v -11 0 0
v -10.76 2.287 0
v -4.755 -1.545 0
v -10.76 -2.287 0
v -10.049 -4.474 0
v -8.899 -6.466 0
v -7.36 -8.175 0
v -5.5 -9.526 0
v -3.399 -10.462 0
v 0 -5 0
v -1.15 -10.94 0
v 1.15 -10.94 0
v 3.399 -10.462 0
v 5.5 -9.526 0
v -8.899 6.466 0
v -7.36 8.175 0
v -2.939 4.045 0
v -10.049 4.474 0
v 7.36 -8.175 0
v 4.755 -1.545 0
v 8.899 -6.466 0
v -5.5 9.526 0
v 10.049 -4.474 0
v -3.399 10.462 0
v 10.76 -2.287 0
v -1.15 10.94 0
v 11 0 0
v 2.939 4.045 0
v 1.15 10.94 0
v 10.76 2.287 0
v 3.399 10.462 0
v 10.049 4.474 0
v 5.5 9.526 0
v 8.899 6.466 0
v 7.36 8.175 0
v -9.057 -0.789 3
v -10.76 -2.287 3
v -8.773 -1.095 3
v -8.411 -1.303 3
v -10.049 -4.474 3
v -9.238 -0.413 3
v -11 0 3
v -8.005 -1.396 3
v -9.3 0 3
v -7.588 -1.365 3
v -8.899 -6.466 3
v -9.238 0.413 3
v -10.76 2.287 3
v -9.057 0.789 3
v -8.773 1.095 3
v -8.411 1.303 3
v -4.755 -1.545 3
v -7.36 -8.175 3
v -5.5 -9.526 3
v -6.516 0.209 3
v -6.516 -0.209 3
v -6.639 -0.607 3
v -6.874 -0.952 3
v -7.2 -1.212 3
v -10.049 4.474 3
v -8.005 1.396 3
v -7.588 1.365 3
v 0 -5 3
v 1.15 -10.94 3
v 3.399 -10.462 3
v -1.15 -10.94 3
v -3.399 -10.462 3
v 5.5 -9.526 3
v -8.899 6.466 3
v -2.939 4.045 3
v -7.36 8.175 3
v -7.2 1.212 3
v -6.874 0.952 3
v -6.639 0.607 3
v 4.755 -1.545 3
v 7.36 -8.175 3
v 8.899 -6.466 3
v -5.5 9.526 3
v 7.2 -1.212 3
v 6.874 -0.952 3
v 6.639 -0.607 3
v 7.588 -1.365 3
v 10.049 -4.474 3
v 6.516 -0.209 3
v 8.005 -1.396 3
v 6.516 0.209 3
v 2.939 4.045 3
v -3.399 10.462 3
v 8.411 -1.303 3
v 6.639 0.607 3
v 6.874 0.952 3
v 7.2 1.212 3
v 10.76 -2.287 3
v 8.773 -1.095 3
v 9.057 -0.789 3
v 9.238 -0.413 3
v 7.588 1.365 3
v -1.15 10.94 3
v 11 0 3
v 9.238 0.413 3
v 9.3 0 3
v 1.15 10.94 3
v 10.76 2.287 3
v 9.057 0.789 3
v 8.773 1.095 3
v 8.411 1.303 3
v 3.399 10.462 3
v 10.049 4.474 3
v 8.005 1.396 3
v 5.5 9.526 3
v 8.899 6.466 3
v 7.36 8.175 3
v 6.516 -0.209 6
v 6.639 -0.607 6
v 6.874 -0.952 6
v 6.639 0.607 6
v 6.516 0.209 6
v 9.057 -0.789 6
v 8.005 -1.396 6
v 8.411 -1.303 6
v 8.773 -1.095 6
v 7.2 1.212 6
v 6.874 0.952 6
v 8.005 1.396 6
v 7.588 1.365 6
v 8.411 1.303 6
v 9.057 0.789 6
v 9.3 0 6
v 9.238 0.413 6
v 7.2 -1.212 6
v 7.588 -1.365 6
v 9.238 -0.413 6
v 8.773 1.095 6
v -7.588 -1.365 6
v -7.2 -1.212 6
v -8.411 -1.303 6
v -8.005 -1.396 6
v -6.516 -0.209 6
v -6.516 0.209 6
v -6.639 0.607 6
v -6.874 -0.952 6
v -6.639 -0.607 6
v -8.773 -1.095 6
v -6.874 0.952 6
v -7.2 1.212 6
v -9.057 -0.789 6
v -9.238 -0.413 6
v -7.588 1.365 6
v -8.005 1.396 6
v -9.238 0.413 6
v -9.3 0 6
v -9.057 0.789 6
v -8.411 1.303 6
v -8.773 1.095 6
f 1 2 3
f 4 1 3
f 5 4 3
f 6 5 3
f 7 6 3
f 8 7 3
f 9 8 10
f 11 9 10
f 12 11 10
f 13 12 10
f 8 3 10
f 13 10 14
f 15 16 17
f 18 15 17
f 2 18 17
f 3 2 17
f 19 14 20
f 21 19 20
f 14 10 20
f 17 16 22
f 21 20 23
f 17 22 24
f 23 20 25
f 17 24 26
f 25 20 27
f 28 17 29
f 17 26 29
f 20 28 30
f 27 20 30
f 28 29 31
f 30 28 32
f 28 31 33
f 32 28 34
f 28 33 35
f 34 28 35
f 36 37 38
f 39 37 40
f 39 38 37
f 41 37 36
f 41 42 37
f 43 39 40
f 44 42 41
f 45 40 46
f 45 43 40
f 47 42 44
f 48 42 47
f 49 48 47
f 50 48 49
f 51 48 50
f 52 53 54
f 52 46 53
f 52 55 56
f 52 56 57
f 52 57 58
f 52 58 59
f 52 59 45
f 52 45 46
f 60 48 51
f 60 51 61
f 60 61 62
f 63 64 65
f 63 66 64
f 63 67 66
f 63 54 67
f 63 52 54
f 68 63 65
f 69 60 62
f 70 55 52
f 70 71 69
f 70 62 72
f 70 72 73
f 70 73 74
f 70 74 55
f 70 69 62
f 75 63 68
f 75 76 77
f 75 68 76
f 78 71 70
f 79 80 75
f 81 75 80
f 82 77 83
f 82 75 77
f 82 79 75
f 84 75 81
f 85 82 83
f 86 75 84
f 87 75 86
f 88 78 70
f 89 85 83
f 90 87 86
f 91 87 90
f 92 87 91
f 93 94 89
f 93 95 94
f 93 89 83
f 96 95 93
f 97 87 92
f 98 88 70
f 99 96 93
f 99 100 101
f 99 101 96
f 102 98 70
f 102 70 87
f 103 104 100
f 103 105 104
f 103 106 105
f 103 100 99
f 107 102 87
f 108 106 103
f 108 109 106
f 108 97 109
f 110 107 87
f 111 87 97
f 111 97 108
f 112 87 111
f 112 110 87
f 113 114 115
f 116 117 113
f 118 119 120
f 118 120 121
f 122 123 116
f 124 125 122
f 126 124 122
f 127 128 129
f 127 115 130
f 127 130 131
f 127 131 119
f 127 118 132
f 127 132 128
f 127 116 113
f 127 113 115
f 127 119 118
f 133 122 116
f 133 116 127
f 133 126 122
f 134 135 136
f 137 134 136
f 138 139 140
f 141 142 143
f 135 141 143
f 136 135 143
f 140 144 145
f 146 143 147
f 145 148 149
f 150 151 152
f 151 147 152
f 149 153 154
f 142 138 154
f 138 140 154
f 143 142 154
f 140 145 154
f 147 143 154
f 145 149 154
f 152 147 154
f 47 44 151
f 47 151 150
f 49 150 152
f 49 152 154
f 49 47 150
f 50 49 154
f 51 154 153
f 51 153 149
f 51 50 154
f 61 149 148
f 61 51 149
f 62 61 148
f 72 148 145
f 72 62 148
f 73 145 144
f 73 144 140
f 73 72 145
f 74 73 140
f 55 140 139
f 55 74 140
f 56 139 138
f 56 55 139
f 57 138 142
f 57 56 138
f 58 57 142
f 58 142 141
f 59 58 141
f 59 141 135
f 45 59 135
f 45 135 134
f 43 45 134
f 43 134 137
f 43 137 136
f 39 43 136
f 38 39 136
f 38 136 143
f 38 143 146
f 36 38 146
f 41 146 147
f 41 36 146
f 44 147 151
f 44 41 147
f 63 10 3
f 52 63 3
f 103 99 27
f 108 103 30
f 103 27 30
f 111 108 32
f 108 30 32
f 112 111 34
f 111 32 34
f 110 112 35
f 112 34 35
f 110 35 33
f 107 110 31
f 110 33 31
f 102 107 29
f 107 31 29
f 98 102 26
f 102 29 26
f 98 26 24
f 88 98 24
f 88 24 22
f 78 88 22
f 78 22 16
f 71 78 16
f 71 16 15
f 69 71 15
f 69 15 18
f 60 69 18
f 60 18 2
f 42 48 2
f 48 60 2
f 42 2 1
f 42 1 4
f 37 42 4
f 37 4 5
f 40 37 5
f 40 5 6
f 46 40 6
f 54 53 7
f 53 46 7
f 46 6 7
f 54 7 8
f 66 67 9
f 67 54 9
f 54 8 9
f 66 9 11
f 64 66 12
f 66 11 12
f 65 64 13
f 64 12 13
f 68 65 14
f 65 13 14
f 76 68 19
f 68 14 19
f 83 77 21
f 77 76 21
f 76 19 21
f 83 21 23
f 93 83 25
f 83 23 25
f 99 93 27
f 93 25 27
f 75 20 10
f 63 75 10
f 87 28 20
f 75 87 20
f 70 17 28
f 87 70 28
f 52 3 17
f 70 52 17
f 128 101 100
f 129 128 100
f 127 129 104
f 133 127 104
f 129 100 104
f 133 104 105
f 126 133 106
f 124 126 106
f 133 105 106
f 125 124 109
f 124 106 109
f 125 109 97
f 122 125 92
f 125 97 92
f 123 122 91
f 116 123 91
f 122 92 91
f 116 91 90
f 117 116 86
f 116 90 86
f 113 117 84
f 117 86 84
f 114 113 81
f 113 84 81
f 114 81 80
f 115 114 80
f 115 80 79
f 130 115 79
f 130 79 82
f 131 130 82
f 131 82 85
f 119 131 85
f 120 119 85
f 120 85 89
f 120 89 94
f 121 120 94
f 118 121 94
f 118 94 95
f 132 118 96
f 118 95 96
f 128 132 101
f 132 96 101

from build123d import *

# Parameters (mm, degrees)
F0_R     = 11
F1_DEPTH = 3
F2_R     = 1.4
F3_DEPTH = 3


with BuildPart() as f1:
    # F0 (on Top) → F1 (new body)
    with BuildSketch(Plane.XY):
        Circle(F0_R)
        Polygon((4.7552825815, -1.5450849719), (0, -5), (-4.7552825815, -1.5450849719), (-2.9389262615, 4.0450849719), (2.9389262615, 4.0450849719), align=None, mode=Mode.SUBTRACT)
    extrude(amount=F1_DEPTH)

    # F2 (on face) → F3 (join)
    with BuildSketch(Plane.XY.offset(3)):
        with Locations((7.9, 0)):
            Circle(F2_R)
    extrude(amount=F3_DEPTH)

    # F4: F1 across plane


with BuildPart() as f1_1:
    add(f1.part)
    add(f1.part.mirror(Plane.YZ))


solid = f1_1.part
